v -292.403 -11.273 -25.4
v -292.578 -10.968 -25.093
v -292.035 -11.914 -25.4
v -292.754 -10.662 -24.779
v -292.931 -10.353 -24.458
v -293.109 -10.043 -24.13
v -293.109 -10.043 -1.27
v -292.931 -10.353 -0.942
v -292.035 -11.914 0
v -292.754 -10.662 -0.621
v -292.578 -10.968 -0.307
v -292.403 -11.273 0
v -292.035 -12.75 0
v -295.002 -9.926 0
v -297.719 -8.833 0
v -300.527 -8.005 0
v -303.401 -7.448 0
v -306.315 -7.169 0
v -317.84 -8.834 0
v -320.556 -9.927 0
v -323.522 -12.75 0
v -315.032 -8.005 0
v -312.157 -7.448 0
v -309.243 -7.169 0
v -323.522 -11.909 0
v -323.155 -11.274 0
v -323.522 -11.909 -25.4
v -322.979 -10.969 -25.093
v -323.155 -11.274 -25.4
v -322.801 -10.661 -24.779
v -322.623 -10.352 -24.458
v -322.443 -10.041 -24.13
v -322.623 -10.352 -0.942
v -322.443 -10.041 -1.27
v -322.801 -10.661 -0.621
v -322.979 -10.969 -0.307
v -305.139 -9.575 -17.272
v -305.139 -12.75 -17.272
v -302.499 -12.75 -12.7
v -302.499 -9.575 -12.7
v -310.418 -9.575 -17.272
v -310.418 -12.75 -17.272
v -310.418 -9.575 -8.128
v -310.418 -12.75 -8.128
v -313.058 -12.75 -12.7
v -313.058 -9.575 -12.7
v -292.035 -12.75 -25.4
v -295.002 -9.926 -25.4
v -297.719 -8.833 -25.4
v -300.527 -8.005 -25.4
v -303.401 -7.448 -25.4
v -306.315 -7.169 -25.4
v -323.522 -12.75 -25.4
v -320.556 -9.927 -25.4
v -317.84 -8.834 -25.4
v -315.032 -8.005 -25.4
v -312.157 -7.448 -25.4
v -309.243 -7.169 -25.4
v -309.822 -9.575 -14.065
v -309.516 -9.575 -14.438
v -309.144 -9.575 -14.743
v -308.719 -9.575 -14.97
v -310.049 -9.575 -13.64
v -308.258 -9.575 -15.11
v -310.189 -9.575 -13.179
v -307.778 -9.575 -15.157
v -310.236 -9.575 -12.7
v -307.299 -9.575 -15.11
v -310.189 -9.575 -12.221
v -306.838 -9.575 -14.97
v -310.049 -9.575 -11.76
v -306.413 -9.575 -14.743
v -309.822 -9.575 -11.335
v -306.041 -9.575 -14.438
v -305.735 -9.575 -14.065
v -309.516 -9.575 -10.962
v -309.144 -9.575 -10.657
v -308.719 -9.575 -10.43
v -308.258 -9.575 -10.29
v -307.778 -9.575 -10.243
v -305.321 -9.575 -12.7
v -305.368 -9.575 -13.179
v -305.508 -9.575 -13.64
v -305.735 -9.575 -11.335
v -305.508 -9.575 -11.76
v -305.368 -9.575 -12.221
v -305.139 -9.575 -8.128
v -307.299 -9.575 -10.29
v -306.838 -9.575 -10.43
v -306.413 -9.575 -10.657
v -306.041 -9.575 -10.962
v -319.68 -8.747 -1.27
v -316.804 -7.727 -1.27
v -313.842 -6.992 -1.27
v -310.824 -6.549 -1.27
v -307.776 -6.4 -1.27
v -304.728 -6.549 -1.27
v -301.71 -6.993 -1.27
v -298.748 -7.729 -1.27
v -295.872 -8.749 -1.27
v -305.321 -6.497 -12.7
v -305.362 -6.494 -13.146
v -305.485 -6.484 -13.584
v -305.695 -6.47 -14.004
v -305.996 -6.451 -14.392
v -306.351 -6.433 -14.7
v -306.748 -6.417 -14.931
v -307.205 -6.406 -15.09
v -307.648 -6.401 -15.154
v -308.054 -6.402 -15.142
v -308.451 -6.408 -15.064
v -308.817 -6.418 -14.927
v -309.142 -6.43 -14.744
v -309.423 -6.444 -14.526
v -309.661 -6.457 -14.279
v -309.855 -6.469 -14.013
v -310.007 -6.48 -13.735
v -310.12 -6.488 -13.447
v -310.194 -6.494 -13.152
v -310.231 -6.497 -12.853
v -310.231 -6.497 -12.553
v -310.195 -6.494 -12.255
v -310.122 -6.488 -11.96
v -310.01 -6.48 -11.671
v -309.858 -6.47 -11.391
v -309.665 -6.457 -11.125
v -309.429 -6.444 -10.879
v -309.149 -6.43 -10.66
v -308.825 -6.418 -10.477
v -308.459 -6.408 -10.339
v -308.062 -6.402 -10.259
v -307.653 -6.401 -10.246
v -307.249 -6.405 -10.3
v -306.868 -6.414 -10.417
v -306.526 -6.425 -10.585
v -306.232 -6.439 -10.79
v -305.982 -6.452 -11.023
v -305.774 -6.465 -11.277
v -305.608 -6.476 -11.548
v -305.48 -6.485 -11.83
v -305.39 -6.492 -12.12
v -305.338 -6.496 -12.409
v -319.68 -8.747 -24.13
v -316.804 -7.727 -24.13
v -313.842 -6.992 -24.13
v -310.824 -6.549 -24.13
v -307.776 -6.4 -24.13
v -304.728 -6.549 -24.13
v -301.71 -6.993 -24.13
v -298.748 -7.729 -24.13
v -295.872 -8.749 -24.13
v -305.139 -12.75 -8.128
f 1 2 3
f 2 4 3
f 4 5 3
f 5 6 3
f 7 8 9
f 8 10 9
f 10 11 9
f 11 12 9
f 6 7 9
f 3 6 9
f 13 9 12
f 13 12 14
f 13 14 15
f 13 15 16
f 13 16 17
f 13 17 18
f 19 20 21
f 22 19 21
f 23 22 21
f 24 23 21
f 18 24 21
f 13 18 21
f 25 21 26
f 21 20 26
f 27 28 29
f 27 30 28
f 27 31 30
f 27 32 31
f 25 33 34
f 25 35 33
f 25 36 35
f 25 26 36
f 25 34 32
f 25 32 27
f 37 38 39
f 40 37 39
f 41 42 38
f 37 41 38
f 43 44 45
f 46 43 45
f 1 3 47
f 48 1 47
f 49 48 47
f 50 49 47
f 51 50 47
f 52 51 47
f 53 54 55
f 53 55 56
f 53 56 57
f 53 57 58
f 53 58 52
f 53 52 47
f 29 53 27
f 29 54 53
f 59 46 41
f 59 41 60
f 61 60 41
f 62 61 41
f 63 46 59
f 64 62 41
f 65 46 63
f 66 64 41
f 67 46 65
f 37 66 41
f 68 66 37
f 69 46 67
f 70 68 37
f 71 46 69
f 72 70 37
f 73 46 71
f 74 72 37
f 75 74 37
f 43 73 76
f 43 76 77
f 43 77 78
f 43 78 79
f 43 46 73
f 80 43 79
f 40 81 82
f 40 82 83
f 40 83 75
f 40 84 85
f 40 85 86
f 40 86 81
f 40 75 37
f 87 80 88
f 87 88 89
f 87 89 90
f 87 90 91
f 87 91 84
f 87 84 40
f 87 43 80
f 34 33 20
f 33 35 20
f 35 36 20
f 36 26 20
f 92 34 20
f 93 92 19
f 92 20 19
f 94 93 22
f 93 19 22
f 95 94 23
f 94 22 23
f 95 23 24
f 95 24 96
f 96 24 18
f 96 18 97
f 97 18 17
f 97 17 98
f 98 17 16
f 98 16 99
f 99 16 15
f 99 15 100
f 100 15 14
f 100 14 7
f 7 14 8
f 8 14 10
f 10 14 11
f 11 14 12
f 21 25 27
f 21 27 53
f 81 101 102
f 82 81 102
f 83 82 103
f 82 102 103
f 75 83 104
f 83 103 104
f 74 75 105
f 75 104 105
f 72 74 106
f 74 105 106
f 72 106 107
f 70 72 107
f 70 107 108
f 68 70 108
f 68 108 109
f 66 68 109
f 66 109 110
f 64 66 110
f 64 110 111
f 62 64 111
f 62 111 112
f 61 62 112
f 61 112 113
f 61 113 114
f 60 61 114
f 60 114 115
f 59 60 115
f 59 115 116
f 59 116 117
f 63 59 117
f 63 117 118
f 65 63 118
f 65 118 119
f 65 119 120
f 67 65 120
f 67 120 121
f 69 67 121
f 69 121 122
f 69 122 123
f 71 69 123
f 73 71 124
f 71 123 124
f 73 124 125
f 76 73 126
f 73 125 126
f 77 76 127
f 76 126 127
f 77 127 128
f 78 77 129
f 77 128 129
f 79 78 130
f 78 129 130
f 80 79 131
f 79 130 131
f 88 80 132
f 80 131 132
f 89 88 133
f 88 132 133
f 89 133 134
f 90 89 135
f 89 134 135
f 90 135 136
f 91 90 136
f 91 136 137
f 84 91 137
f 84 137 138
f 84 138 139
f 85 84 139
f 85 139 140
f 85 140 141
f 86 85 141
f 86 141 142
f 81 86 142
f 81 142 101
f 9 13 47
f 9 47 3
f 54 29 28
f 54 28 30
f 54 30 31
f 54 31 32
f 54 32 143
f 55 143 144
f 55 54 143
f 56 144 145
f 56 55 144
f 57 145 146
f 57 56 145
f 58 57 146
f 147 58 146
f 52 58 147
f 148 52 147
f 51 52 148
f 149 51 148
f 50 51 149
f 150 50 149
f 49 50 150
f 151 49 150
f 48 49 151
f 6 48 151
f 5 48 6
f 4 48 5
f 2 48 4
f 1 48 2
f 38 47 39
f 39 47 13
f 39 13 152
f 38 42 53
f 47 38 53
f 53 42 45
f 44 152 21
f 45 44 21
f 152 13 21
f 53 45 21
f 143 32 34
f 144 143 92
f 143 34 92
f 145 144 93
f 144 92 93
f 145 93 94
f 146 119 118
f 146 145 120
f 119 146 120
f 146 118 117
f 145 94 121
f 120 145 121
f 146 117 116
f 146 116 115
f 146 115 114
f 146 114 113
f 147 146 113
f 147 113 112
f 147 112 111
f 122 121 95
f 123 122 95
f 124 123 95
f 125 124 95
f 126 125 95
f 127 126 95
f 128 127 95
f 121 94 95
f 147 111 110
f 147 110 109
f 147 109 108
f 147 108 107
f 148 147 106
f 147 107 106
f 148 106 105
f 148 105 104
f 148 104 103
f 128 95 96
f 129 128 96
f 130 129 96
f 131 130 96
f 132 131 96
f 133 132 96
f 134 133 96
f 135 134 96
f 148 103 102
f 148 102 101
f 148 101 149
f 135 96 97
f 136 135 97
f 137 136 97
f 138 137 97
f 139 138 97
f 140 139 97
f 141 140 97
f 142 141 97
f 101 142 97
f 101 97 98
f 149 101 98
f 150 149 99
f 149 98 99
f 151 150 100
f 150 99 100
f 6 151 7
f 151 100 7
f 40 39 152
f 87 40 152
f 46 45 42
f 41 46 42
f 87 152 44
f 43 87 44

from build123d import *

# Parameters (mm, degrees)
BOSS_EXTRUDE1_DEPTH   = 25.4
CUT_EXTRUDE1_REACH    = 329.931
F_8_CLEARANCE_HOLE1_D = 4.9149
CHAMFER1_SIZE         = 1.275307785
CHAMFER1_SIZE_2       = 1.27
CHAMFER1_SIZE_3       = 0.733234842
CUT_EXTRUDE2_DEPTH    = 3.175


with BuildPart() as part:
    # Sketch1 → Boss-Extrude1 (new body)
    with BuildSketch(Plane.XY):
        with BuildLine():
            Line((-288.860017795, -12.750441382), (-326.696640794, -12.750441382))
            ThreePointArc((-326.696640794, -12.750441382), (-307.778329294, -6.400441382), (-288.860017795, -12.750441382))
        make_face()
    extrude(amount=-BOSS_EXTRUDE1_DEPTH)

    # Sketch2 → Cut-Extrude1 (cut, up to next)
    with BuildSketch(Plane.XY, mode=Mode.PRIVATE) as cut_extrude1_sk1:
        with BuildLine():
            Line((-292.035017795, -12.750441382), (-292.035017795, -10.639114407))
            ThreePointArc((-292.035017795, -10.639114407), (-290.415395998, -11.646473343), (-288.860017795, -12.750441382))
            Line((-288.860017795, -12.750441382), (-292.035017795, -12.750441382))
        make_face()
    cut_extrude1_tool1 = extrude(cut_extrude1_sk1.sketch, amount=-CUT_EXTRUDE1_REACH, mode=Mode.PRIVATE) & part.part
    # Sketch2 → Cut-Extrude1 (cut, up to next)
    with BuildSketch(Plane.XY, mode=Mode.PRIVATE) as cut_extrude1_sk2:
        with BuildLine():
            Line((-323.521640794, -12.750441382), (-326.696640794, -12.750441382))
            ThreePointArc((-326.696640794, -12.750441382), (-325.14126259, -11.646473343), (-323.521640794, -10.639114407))
            Line((-323.521640794, -10.639114407), (-323.521640794, -12.750441382))
        make_face()
    cut_extrude1_tool2 = extrude(cut_extrude1_sk2.sketch, amount=-CUT_EXTRUDE1_REACH, mode=Mode.PRIVATE) & part.part
    add(cut_extrude1_tool1.solids().sort_by_distance((-290.95384, -12.03102, 0))[0], mode=Mode.SUBTRACT)
    add(cut_extrude1_tool2.solids().sort_by_distance((-324.602819, -12.03102, 0))[0], mode=Mode.SUBTRACT)

    # #8 Clearance Hole1 (through all)
    with Locations(Plane(origin=(0, -12.750441382, 0), x_dir=(-1, 0, 0), z_dir=(0, -1, 0))):
        with Locations((307.778329294, 12.7)):
            Hole(F_8_CLEARANCE_HOLE1_D / 2)

    # Chamfer1
    # the kernel refuses this chamfer: 1.275307785, 1.27, 0.733234842 mm, written as the material it takes off along each edge
    with BuildSketch(Plane(origin=(-292.035017795, -10.639114407, 3.299478256), x_dir=(-0.8744921081912179, 0.4850397434347821, 0), z_dir=(0, 0, -1))) as chamfer1_piece_1:
        with BuildLine():
            Line((1.228549666, 0), (-CHAMFER1_SIZE * 0.485039743592, -CHAMFER1_SIZE * 0.874492108474))
            Line((-CHAMFER1_SIZE * 0.485039743592, -CHAMFER1_SIZE * 0.874492108474), (0, 0))
            ThreePointArc((0, 0), (0.636104744, 0.006009849), (1.228549666, 0))
        make_face()
    extrude(amount=31.998956511, mode=Mode.SUBTRACT)
    with BuildSketch(Plane(origin=(-323.521640794, -10.639114407, 3.286063629), x_dir=(0.8745288770995413, 0.4849734457875147, 0), z_dir=(0, 0, -1))) as chamfer1_piece_2:
        with BuildLine():
            Line((1.233303065, 0), (-CHAMFER1_SIZE_2 * 0.484973445787, CHAMFER1_SIZE_2 * 0.8745288771))
            Line((-CHAMFER1_SIZE_2 * 0.484973445787, CHAMFER1_SIZE_2 * 0.8745288771), (0, 0))
            ThreePointArc((0, 0), (0.638512102, -0.006056486), (1.233303065, 0))
        make_face()
    extrude(amount=31.972127259, mode=Mode.SUBTRACT)
    # the kernel refuses this chamfer: 1.275307785, 1.27, 0.733234842 mm, written as the material it takes off along each edge
    with BuildSketch(Plane(origin=(-307.778329294, -37.756741382, -25.4), x_dir=(-0.5575773235938082, 0.8301250075825723, 0), z_dir=(-0.8301250075825723, -0.5575773235938082, 0))) as chamfer1_2_piece_1:
        Polygon((31.3563, -CHAMFER1_SIZE_2), (31.3563 - CHAMFER1_SIZE_3, 0), (31.3563, 0), align=None)
    revolve(axis=Axis((-307.778329294, -37.756741382, -25.4), (0, 0, -1)), revolution_arc=67.785524428, mode=Mode.SUBTRACT)
    with BuildSketch(Plane(origin=(-307.778329294, -37.756741382, 0), x_dir=(-0.5575773235938082, 0.8301250075825723, 0), z_dir=(-0.8301250075825723, -0.5575773235938082, 0))) as chamfer1_2_piece_2:
        Polygon((31.3563, CHAMFER1_SIZE_2), (31.3563 - CHAMFER1_SIZE_3, 0), (31.3563, 0), align=None)
    revolve(axis=Axis((-307.778329294, -37.756741382, 0), (0, 0, -1)), revolution_arc=67.785524428, mode=Mode.SUBTRACT)

    # Sketch5 → Cut-Extrude2 (cut)
    with BuildSketch(Plane.XZ.offset(12.750441382)):
        Polygon((-310.417974725, -17.272), (-305.138683864, -17.272), (-302.499038433, -12.7), (-305.138683864, -8.128), (-310.417974725, -8.128), (-313.057620156, -12.7), align=None)
    extrude(amount=-CUT_EXTRUDE2_DEPTH, mode=Mode.SUBTRACT)


solid = part.part
